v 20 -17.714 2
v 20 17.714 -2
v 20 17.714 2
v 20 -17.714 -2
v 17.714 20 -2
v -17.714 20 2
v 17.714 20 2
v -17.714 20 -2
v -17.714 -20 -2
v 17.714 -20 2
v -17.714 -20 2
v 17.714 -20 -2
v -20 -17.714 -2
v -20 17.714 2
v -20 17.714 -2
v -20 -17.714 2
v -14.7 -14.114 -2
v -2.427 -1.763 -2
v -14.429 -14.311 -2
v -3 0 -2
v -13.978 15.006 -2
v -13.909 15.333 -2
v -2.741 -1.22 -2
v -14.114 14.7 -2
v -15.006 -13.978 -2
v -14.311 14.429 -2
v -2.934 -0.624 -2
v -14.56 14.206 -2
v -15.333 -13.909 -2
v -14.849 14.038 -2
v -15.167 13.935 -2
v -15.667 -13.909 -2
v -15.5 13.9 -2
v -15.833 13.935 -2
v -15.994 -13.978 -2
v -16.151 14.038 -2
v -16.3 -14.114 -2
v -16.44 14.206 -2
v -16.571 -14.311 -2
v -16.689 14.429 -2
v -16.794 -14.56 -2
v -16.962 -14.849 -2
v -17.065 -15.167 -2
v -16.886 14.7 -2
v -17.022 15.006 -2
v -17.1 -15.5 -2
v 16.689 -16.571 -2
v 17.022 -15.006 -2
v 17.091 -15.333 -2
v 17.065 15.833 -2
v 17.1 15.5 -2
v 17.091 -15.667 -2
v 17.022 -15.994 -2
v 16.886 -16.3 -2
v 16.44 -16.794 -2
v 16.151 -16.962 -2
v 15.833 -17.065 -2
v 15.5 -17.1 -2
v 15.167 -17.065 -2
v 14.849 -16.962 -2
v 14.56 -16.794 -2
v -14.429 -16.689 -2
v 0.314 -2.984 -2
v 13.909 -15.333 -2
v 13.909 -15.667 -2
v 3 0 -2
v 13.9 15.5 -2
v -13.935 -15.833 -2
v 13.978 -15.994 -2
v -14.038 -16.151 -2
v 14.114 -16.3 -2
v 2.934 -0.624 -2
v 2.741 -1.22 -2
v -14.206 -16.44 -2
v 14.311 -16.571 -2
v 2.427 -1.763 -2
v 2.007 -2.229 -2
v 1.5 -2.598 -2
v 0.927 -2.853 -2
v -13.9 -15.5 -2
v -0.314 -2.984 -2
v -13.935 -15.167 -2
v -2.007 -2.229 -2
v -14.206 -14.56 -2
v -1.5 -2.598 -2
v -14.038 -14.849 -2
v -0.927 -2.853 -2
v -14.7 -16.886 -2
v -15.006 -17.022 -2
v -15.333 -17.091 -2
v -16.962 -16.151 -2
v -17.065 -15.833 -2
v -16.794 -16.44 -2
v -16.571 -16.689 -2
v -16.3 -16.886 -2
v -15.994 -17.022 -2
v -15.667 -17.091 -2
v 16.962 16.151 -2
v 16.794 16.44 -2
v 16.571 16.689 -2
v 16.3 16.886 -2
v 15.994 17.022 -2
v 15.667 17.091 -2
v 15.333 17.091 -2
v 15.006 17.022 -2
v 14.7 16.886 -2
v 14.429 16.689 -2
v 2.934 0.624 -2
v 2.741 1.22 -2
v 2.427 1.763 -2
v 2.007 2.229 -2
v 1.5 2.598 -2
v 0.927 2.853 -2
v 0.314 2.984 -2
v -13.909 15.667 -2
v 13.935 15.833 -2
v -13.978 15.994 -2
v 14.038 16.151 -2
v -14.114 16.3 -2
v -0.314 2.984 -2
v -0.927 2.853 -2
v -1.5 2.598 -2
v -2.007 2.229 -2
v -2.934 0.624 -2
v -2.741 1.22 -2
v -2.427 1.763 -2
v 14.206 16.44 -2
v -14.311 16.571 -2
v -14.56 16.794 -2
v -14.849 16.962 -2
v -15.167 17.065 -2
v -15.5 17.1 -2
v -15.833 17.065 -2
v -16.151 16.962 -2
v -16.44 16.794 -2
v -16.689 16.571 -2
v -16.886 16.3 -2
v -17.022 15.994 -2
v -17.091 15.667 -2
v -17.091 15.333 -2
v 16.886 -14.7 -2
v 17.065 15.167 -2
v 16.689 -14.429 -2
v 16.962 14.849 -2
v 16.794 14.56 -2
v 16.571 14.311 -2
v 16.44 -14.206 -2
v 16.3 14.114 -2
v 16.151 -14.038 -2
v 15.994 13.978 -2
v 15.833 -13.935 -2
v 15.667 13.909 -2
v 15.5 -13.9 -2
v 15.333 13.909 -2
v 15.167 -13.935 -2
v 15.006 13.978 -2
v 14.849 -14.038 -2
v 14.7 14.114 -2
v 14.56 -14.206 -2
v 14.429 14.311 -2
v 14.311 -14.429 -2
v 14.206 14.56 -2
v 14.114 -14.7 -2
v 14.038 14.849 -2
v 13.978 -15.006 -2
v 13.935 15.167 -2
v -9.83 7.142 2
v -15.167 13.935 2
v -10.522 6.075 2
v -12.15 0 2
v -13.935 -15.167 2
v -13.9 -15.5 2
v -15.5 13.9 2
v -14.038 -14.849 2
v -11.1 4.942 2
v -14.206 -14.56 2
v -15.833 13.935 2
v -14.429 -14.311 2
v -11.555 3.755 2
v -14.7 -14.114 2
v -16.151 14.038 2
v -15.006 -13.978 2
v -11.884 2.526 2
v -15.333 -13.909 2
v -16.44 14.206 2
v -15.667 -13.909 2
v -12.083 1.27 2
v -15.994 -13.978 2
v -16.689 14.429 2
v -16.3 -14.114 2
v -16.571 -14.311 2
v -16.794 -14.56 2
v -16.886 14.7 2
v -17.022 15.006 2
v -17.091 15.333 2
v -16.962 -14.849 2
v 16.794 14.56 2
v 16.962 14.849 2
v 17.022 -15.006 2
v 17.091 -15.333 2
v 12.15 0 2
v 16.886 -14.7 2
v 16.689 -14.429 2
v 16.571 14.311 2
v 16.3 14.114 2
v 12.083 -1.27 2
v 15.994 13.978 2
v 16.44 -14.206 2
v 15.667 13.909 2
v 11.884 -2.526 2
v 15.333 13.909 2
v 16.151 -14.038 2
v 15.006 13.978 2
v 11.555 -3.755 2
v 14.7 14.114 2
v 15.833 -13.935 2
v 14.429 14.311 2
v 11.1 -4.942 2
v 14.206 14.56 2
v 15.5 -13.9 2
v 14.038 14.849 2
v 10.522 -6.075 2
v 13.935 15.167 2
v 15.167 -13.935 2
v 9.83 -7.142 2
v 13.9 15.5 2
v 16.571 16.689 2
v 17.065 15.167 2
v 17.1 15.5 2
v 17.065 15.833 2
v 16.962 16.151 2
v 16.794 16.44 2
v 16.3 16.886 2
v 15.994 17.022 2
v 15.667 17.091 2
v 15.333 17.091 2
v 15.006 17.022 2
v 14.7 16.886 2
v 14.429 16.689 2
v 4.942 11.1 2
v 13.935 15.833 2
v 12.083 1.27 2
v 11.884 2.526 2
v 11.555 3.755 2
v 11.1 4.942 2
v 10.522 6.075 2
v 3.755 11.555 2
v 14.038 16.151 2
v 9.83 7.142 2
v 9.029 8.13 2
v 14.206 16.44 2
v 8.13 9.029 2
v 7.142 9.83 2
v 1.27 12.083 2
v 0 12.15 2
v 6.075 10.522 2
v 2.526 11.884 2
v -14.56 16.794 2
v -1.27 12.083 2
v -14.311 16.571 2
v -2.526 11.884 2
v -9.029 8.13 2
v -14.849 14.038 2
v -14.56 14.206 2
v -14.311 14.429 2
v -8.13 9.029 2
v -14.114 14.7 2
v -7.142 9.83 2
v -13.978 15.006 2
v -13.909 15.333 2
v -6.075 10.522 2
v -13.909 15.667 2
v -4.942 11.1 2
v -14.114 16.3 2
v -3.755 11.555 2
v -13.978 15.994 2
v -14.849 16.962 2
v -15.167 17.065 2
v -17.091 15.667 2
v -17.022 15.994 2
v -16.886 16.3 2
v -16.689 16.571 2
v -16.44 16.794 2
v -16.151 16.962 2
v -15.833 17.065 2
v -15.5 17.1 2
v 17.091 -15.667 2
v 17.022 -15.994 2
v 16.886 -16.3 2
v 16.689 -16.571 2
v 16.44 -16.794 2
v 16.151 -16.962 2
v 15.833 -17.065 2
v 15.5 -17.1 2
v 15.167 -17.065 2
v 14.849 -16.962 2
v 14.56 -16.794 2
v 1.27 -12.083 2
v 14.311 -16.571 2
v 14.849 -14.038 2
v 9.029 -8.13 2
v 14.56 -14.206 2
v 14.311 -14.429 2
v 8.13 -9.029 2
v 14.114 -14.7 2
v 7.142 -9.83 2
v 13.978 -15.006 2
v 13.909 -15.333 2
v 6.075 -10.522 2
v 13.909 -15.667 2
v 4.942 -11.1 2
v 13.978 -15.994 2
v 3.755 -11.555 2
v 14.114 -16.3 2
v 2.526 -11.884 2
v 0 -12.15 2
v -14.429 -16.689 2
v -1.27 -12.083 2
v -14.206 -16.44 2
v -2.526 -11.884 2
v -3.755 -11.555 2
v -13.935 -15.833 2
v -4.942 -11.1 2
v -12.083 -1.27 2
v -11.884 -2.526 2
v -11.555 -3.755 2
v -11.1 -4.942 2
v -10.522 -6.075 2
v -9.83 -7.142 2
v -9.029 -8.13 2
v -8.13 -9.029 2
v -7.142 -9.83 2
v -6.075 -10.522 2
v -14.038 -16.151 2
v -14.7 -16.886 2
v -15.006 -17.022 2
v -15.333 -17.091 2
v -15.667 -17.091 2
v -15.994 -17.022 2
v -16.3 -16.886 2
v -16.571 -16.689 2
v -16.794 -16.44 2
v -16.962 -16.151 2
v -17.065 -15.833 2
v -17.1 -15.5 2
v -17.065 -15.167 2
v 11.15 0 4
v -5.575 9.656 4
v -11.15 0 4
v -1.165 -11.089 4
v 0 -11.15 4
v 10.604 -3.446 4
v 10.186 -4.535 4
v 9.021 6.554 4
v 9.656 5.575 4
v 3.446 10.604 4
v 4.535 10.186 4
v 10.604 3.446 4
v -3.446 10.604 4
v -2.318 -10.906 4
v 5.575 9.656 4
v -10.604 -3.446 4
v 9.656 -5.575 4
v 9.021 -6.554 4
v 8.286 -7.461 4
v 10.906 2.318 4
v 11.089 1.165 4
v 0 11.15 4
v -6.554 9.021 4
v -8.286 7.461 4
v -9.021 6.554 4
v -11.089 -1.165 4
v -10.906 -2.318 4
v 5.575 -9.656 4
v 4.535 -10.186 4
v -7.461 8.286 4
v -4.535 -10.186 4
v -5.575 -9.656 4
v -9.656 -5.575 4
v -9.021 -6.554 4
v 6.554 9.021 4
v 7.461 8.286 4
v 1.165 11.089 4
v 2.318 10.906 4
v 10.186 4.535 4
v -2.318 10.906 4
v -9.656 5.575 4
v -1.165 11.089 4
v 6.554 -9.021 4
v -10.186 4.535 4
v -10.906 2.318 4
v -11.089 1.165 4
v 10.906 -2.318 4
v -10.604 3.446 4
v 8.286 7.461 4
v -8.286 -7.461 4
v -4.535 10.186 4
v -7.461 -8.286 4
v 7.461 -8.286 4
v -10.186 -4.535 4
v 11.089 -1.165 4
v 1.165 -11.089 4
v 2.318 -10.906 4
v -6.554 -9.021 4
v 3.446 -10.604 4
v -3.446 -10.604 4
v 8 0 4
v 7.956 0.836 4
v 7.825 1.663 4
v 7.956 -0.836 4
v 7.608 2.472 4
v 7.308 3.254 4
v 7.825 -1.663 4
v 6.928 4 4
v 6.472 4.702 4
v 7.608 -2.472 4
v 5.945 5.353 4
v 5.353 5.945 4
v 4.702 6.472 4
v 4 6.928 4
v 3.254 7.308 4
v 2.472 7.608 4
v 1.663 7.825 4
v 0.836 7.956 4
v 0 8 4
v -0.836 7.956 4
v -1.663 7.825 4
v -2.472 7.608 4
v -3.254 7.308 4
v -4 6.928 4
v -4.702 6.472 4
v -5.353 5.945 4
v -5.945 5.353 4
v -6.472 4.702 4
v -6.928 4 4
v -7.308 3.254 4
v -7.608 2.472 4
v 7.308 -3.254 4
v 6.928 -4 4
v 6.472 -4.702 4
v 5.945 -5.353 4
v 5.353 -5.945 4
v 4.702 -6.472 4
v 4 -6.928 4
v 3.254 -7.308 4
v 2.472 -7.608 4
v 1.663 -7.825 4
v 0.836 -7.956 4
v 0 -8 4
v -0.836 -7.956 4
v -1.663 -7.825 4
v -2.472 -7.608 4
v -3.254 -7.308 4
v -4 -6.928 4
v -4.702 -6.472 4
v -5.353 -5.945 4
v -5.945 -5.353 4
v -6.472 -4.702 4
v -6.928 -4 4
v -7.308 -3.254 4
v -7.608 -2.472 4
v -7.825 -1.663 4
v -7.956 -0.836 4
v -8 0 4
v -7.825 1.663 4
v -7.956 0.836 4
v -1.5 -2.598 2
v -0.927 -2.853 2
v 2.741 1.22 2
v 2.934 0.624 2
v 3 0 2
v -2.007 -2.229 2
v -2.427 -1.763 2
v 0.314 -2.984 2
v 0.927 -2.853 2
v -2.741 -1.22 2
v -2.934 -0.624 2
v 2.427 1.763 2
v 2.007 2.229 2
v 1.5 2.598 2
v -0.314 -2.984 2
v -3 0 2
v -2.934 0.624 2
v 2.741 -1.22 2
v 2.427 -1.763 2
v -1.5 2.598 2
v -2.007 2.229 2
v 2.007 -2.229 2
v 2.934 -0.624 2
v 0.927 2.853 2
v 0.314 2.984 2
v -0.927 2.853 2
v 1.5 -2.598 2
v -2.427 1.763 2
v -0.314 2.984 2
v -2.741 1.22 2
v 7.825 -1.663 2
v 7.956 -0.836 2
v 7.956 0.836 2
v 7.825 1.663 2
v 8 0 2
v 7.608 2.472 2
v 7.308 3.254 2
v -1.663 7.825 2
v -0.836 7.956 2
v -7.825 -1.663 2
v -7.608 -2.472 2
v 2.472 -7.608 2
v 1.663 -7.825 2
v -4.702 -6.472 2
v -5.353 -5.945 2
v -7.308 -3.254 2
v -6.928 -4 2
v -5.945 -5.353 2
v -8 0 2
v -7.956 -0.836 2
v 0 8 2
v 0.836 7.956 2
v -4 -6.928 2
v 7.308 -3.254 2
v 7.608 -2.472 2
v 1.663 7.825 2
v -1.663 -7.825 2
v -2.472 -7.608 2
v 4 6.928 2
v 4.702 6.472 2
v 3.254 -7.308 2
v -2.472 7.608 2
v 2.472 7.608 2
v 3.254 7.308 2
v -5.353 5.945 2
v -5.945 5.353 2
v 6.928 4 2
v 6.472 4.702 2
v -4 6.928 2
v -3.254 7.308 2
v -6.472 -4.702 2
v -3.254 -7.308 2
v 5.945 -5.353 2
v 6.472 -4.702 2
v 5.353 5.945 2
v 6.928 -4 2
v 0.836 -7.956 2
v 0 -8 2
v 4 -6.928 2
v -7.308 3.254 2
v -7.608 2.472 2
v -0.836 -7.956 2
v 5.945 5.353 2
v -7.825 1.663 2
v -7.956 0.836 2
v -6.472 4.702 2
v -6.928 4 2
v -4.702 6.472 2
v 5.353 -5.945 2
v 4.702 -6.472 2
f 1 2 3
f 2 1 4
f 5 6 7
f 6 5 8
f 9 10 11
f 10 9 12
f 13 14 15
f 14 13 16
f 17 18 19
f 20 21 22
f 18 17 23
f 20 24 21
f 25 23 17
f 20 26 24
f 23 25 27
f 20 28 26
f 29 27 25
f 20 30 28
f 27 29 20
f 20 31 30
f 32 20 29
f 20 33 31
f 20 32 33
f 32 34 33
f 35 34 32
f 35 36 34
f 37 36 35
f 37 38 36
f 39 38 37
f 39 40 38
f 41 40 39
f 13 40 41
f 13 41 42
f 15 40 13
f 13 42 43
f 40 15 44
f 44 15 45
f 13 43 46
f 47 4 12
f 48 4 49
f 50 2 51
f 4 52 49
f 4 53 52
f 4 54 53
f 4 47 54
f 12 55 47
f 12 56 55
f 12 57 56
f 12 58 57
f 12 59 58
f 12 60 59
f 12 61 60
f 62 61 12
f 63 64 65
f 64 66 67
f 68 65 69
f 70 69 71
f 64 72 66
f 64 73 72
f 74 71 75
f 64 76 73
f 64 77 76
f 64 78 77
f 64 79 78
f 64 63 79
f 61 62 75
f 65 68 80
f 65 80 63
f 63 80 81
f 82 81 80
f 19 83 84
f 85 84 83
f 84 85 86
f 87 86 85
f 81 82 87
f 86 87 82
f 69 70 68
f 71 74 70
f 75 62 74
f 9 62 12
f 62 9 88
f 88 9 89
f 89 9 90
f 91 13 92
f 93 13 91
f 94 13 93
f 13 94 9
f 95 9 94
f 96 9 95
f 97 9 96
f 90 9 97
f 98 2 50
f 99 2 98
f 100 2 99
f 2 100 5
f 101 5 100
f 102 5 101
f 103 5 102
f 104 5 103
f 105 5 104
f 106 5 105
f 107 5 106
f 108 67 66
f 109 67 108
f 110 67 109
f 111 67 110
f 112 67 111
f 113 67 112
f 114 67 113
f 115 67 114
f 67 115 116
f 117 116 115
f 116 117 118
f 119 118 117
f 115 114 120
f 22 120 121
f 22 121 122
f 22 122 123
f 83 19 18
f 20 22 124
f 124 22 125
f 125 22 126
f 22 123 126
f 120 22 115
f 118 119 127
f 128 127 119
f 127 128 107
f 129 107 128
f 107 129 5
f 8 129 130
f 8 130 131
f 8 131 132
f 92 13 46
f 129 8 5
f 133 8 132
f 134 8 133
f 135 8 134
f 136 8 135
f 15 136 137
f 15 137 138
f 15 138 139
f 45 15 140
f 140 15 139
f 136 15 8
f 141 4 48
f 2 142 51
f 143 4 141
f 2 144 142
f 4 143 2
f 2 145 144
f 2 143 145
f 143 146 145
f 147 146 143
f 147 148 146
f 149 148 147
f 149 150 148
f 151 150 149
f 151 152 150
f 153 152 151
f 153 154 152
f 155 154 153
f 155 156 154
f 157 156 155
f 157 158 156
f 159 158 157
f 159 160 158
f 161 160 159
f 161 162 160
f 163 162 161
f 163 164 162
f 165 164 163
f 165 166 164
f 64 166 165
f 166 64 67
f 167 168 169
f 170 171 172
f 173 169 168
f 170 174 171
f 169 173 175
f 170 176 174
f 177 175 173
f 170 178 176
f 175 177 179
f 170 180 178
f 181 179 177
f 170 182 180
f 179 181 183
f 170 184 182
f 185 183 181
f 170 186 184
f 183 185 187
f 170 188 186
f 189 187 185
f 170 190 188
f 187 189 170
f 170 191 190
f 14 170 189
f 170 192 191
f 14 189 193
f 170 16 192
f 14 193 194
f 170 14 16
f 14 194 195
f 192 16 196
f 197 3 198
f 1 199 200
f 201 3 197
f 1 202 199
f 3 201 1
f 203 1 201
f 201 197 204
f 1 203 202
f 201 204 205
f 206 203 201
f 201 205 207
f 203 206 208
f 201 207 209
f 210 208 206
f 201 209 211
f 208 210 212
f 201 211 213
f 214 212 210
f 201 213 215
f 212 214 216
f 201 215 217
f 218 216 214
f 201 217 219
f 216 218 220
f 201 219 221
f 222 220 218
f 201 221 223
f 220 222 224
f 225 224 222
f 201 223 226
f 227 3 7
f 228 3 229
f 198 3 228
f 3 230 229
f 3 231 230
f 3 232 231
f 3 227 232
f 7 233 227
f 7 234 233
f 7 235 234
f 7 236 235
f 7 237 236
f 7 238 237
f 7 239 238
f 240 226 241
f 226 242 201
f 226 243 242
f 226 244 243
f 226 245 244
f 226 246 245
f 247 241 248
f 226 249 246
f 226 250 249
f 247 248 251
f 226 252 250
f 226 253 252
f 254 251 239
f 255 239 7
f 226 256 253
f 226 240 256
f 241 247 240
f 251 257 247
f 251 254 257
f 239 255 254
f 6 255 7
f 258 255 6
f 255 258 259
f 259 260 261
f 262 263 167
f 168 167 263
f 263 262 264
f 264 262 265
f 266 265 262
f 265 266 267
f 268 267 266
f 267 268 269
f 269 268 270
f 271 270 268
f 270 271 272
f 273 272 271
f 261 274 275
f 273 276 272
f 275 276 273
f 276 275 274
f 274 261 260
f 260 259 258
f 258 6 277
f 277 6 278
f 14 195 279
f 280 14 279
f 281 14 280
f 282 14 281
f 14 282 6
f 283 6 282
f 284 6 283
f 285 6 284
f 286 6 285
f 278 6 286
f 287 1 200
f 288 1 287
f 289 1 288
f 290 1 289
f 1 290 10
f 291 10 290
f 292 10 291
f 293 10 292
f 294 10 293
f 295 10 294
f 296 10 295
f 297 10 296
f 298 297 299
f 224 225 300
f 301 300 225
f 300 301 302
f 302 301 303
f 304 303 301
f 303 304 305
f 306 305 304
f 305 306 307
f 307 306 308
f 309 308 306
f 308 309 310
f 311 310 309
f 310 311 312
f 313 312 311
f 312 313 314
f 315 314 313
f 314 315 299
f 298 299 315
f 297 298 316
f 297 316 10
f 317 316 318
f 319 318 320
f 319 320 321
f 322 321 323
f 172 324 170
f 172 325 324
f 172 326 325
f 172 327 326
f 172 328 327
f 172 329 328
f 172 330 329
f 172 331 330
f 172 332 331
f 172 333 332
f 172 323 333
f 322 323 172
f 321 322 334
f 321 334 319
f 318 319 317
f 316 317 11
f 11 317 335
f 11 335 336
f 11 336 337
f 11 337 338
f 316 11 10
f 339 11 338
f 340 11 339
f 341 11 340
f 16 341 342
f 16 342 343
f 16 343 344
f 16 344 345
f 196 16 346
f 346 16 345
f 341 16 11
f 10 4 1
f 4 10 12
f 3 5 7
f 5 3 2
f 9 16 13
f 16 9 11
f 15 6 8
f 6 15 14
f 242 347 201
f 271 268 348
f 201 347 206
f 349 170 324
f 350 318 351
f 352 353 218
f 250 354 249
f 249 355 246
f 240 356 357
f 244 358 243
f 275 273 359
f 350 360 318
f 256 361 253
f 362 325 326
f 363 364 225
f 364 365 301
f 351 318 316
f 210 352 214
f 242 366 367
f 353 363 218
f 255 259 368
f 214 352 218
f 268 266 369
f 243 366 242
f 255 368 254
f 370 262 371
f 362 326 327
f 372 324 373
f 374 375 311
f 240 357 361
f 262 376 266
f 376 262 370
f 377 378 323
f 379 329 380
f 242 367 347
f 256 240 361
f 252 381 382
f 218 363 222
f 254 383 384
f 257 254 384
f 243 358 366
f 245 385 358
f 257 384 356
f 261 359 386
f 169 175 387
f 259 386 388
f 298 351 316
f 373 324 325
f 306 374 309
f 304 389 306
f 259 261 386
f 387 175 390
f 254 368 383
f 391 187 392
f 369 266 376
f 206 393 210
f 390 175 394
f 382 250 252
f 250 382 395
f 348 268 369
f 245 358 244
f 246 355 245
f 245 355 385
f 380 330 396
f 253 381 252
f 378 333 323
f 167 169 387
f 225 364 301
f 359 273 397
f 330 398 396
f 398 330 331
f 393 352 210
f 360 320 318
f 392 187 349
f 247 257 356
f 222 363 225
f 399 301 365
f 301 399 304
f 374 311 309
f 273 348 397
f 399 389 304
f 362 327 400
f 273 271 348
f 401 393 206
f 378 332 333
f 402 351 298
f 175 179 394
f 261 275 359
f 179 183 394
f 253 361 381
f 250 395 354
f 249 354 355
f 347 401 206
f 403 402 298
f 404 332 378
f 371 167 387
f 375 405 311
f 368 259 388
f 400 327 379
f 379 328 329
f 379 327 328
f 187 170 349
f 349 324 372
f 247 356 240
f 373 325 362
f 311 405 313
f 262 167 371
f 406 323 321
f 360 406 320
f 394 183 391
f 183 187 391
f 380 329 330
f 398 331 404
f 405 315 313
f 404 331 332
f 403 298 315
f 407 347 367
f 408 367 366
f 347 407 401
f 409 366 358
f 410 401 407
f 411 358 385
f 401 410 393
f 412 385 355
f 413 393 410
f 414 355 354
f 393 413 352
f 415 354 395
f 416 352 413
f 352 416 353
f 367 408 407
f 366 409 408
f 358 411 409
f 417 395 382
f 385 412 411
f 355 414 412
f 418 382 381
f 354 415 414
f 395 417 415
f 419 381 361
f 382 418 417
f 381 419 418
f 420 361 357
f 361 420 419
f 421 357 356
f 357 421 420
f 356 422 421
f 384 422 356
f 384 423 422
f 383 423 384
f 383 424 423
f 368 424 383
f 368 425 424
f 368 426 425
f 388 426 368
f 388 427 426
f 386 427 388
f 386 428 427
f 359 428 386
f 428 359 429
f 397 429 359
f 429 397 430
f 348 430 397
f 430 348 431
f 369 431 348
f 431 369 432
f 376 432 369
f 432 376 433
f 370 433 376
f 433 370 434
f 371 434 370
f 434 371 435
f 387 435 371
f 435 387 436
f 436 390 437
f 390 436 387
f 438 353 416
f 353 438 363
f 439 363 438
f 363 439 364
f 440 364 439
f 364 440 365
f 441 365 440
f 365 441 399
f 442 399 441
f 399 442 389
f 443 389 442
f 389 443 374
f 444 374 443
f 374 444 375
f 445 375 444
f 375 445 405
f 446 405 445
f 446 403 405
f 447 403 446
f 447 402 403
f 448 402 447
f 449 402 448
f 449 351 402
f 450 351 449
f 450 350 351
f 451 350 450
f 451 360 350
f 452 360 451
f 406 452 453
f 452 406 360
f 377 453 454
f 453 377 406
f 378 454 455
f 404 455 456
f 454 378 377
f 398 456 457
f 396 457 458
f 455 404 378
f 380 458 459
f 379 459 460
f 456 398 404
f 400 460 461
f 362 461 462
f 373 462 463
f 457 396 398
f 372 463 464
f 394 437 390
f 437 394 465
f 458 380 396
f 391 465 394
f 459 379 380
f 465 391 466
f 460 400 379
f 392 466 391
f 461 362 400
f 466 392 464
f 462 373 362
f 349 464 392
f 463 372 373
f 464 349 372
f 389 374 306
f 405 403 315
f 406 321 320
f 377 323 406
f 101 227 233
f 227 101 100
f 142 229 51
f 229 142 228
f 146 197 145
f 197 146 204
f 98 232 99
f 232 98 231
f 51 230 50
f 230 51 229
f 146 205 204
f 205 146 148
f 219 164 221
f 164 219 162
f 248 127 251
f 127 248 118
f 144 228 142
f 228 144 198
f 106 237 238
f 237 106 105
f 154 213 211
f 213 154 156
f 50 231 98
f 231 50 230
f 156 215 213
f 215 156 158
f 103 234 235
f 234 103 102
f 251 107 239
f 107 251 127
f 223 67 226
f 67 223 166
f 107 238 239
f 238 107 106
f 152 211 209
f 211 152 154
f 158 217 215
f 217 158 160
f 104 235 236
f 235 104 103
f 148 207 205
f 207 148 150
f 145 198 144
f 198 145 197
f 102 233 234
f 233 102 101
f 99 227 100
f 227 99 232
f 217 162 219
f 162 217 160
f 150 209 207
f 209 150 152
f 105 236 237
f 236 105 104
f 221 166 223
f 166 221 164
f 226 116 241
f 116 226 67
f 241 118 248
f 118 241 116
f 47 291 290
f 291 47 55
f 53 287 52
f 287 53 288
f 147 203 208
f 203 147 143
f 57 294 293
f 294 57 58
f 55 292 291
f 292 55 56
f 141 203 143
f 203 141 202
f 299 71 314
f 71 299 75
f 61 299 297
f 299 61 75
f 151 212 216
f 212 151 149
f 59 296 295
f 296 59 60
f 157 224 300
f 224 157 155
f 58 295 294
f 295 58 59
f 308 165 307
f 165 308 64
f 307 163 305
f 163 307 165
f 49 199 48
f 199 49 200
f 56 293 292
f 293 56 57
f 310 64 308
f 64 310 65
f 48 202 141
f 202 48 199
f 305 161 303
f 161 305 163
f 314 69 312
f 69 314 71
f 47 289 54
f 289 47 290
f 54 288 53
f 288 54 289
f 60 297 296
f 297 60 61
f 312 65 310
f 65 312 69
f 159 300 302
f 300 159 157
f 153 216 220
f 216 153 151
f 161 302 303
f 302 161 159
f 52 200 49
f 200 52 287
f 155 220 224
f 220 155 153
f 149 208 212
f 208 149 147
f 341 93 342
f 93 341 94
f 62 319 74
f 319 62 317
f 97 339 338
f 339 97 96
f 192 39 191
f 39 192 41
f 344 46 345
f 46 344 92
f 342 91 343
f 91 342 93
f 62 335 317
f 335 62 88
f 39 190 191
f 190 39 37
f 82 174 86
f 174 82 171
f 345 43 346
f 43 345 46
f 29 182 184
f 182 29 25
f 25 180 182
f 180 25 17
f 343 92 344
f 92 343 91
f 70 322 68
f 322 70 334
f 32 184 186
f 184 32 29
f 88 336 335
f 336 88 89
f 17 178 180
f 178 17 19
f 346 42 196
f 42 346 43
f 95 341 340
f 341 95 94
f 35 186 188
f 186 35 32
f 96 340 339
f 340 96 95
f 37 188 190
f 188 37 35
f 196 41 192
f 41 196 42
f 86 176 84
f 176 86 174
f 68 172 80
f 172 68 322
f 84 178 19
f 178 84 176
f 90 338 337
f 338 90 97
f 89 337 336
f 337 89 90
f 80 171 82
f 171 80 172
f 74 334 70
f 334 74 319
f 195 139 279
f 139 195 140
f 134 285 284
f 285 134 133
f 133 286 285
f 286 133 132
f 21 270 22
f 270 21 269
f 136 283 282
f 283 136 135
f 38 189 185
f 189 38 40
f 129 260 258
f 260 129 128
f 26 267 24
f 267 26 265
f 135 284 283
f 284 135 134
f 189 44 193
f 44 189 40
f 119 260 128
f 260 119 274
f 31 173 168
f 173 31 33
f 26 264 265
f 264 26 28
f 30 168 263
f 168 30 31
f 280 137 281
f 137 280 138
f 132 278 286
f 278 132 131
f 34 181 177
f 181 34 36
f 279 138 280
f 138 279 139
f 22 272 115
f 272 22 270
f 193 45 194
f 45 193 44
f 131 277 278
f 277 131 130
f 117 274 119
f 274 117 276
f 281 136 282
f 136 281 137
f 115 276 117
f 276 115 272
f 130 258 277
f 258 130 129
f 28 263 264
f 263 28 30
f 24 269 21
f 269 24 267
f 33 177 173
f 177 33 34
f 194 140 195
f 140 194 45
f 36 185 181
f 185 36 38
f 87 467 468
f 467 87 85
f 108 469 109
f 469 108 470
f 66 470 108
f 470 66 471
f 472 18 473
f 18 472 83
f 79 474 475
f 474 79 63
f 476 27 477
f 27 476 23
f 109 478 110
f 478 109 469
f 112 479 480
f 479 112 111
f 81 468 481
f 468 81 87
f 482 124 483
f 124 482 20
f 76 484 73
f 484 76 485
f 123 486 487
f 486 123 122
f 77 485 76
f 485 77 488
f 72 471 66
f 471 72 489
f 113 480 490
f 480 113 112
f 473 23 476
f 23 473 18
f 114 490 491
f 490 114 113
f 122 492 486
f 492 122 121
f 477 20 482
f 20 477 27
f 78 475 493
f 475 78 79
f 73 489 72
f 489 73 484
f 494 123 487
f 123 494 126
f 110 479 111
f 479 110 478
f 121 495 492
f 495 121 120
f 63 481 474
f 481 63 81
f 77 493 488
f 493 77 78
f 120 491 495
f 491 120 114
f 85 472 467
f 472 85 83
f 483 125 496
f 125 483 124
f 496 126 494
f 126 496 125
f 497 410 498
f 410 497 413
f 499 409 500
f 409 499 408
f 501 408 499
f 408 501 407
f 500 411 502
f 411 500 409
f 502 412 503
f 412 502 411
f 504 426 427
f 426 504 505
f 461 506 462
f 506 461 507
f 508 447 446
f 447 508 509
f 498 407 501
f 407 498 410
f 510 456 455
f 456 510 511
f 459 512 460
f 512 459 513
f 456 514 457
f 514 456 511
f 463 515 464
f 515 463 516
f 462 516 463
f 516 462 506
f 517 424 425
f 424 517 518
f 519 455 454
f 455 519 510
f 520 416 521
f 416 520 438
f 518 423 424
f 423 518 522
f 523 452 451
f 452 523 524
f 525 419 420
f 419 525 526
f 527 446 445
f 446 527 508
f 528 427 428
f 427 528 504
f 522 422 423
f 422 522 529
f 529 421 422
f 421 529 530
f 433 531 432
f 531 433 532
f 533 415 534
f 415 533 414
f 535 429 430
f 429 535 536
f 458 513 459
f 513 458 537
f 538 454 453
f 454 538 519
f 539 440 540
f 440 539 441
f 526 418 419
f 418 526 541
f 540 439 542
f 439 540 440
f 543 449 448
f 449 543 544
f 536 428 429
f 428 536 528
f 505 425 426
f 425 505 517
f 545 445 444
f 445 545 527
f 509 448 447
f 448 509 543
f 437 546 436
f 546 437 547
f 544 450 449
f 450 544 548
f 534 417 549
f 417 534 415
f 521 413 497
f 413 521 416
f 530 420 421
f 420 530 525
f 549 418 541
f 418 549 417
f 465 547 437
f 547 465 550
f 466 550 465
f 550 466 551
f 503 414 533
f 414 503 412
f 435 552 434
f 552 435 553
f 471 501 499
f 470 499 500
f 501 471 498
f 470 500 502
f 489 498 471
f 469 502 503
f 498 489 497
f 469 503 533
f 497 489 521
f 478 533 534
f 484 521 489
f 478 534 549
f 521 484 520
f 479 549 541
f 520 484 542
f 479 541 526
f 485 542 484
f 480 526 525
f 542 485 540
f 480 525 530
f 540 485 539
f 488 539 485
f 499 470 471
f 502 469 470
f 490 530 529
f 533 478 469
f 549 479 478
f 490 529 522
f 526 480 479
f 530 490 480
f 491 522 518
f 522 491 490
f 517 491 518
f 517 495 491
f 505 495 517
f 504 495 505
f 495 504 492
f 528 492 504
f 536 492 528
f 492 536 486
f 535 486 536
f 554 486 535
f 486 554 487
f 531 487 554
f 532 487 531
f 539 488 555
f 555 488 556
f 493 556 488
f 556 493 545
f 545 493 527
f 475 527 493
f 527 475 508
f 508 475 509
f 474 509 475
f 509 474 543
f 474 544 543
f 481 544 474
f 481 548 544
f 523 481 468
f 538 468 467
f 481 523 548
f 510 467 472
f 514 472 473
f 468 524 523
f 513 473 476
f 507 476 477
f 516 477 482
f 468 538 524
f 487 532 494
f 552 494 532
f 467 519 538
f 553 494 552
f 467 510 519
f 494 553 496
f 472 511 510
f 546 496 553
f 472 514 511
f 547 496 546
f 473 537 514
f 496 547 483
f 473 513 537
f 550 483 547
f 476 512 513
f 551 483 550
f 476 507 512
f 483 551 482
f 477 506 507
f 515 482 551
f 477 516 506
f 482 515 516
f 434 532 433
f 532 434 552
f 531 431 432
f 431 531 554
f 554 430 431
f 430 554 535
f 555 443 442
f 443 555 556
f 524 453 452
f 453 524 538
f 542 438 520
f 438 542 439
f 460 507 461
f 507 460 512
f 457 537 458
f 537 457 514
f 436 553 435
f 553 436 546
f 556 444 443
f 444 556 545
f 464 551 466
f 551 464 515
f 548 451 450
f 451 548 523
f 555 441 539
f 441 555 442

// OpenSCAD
// file: beam.scad
// Misumi Beam
module misumibeam(size1=15, size2=15, length=100, extra=0.1) {
   difference() {
      cube([size1+extra, size2+extra, length], center=true);
      for (a = [0:180:180]) rotate([0, 0, a]) {
         translate([size1/2, 0, 0]) {
          //  % cube([size1/2, 3, length+1], center=true);
			minkowski() {
               cube([size1/2-(extra+1), size1/6-extra, length+1], center=true);
               cylinder(r=0.5, h=1, center=true);
			} 
        }
      }
      for (a = [0:90:270]) rotate([0, 0, a]) {
         translate([size2/2, 0, 0]) {
          //  % cube([size1/2, 3, length+1], center=true);
			minkowski() {
               cube([size1/2-(extra+1), size1/6-extra, length+1], center=true);
               cylinder(r=0.5, h=1, center=true);
			} 
        }
      }
   }
}

# misumibeam(15, 15, 300);
// file: nema17.scad
include <configuration.scad>;

// NEMA17 stepper motor

module stepper_motor(length=47.5, shaft_radius=5.00/2) {
   intersection() {
      cube([42.2, length, 42.2], center=true);
      rotate([90, 0, 0])
      cylinder(r=25.5, h=length+1, center=true);
   }
   translate([0, -length/2, 0]) {
// drive shaft
		rotate([90, 0, 0]) {
		 cylinder(r1=11, r2=11, h=2, $fn=40);
		 cylinder(r=shaft_radius, h=25);
		}
// mounting bolts
      for (a = [0:90:360]) rotate([0, a, 0]) {
         translate([15.5, 0, 15.5]) rotate([90, 0, 0])
         cylinder(r=m3_major_radius, h=10,  $fn=30);
      }
   }
}

module stepper_motor_boolean(length=47.5, shaft_radius=7.00/2) {
   intersection() {
      cube([42.2, length, 42.2], center=true);
      rotate([90, 0, 0])
      cylinder(r=25.5, h=length+1, center=true);
   }
   translate([0, -length/2, 0]) {
// drive shaft
		rotate([90, 0, 0]) {
		 cylinder(r1=12+extra_boolean, r2=11+extra_boolean, h=2, $fn=40);
		 cylinder(r=shaft_radius, h=25, $fn=8);
		}
// mounting bolts
      for (a = [0:90:360]) rotate([0, a, 0]) {
         translate([15.5, 0, 15.5]) rotate([90, 0, 0])
         cylinder(r=m3_major_radius+extra_radius, h=10,  $fn=8);
      }
   }
}

//# stepper_motor();
# stepper_motor_boolean();
// file: metric_fastners.scad
/*
 *  OpenSCAD Metric Fastners Library (www.openscad.org)
 *  Copyright (C) 2010-2011  Giles Bathgate
 *
 *  This program is free software; you can redistribute it and/or modify
 *  it under the terms of the GNU General Public License as published by
 *  the Free Software Foundation; either version 3 of the License,
 *  LGPL version 2.1, or (at your option) any later version of the GPL.
 *
 *  This program is distributed in the hope that it will be useful,
 *  but WITHOUT ANY WARRANTY; without even the implied warranty of
 *  MERCHANTABILITY or FITNESS FOR A PARTICULAR PURPOSE.  See the
 *  GNU General Public License for more details.
 *
 *  You should have received a copy of the GNU General Public License
 *  along with this program; if not, write to the Free Software
 *  Foundation, Inc., 59 Temple Place, Suite 330, Boston, MA 02111-1307 USA
 *
*/

$fn=50;
apply_chamfer=false;

// M3 Mesurements
m3_minor_radius = 2.50/2;
m3_major_radius = 3.00/2;
m3_head_radius = 5.50/2;
m3_nut_radius = 6.20/2;

// M4 Mesurements
m4_minor_radius = 3.30/2;
m4_major_radius = 4.00/2;
m4_head_radius = 7.00/2;
m4_nut_radius = 8.26/2;

// M5 Mesurements
m5_minor_radius = 4.20/2;
m5_major_radius = 5.00/2;
m5_head_radius = 8.50/2;
m5_nut_radius = 10.33/2;

// M6 Mesurements
m6_minor_radius = 5.00/2;
m6_major_radius = 6.00/2;
m6_head_radius = 10.00/2;
m6_nut_radius = 12.40/2;


module cap_bolt(dia,len)
{
	e=1.5*dia;
	h1=1.25*dia;
	cylinder(r=dia/2,h=len);
	translate([0,0,-h1]) cylinder(r=e/2,h=h1);
}

module cap_bolt_boolean(dia,len,fn=8)
{
	e=1.87*dia;
	h1=2*dia;
	cylinder(r=dia/2,h=len,$fn=fn);
	translate([0,0,-h1+0.05]) cylinder(r2=e/2+0.15,r1=e/2+0.3,h=h1,$fn=fn);
}

module csk_bolt(dia,len)
{
	h1=0.6*dia;
	h2=len-h1;
	cylinder(r=dia/2,h=h2);
	cylinder(r1=dia,r2=dia/2,h=h1);
}

module washer(dia)
{
	t=0.1*dia;
	difference()
	{
		cylinder(r=dia,h=t);
		translate([0,0,-t/2])cylinder(r=dia/2,h=t*2);
	}
}

module flat_nut(dia)
{
	m=0.8*dia;
	e=2.066*dia;
	c=0.2*dia;
	difference()
	{
		cylinder(r=e/2,h=m,$fn=6);
		translate([0,0,-m/2])cylinder(r=dia/2,h=m*2);
		if(apply_chamfer)
		    translate([0,0,c])cylinder_chamfer(e/2,c);
	}
}

module flat_nut_boolean(dia)
{
	m=0.8*dia;
	e=2.066*dia;
	c=0.2*dia;
	difference()
	{
		cylinder(r=e/2,h=m,$fn=6);
		if(apply_chamfer)
		    translate([0,0,c])cylinder_chamfer(e/2,c);
	}
}

module bolt(dia,len)
{
	e=1.8*dia;
	k=0.7*dia;
	c=0.2*dia;
	difference()
	{
		cylinder(r=e/2,h=k,$fn=6);
		if(apply_chamfer)
		    translate([0,0,c])cylinder_chamfer(e/2,c);
	}

	cylinder(r=dia/2,h=len);

}

module cylinder_chamfer(r1,r2)
{
	t=r1-r2;
	p=r2*2;
	rotate_extrude()
	difference()
	{
		translate([t,-p])square([p,p]);
		translate([t,0])circle(r2);
	}
}

module chamfer(len,r)
{
	p=r*2;
	linear_extrude(height=len)
	difference()
	{
		square([p,p]);
		circle(r);
	}
}

union()
{
//cap_bolt(3,15);
//cap_bolt_boolean(3,15,30);
//csk_bolt(3,14);
//washer(3);
//flat_nut_boolean(3);
//bolt(4,14);
//cylinder_chamfer(8,1);
//chamfer(10,2);
}
// file: configuration.scad
// Delta-Six 3D Printer 
// Created by Sage Merrill
// Released on Openbuilds.com
// Based on orginal design by Johann C. Rocholl (Kossel Printer)
// License = Attribution Share Alike - CC BY SA


include <metric_fastners.scad>;
use <nema17.scad>;
use <beam.scad>;
use <timing_belts.scad>;

$fn=20;

// Increase this if your slicer or printer makes the holes too small.
extra_radius = 0.10;
extra_boolean = 0.15;

// Delta Parameters
global_delta_arm_seperation = 55;
global_effector_bore_radius = 21;
global_mounting_hole_radius = 27;

// M5 Hardware
m5_bolt = m5_major_radius*2;
m5_bolt_boolean = m5_bolt+extra_radius;

// M3 Hardware
m3_bolt = m3_major_radius*2;
m3_bolt_boolean = m3_bolt+extra_radius;

// NEMA17 stepper motor
motor_length = 47.5;
motor_shaft_radius= 5.00/2;
// main file
// Delta-Six 3D Printer 
// Created by Sage Merrill
// Released on Openbuilds.com
// Based on orginal design by Johann C. Rocholl (Kossel Printer)
// License = Attribution Share Alike - CC BY SA

include <configuration.scad>;


module idler_block(length=4, shaft_radius=5.00/2) {
difference() {	
	union() {
		intersection() {
			translate([0, 0, 0]) rotate([0, 0, 0])
			 cube([40, length, 40], center=true);
			translate([0, 0, 0]) rotate([90, 0, 0])
			 cylinder(r=27, h=length+1, center=true, $fn=20);
	  	}

	translate([0, -length/2, 0]) rotate([90, 0, 0])
	 cylinder(r1=12+extra_boolean, r2=11+extra_boolean, h=2, $fn=60);
	}

// idler shaft
	translate([0, 0, 0]) rotate([90, 0, 0])
	 cylinder(r=shaft_radius+0.5, h=50, center=true, $fn=30);

// Bearing shaft
	translate([0, -length/2, 0]) rotate([90, 0, 0])
	 cylinder(r=8, h=5, $fn=60);

// mounting bolts
	for (a = [0:90:360]) rotate([0, a, 0]) {
		translate([15.5, 15, 15.5]) rotate([90, 0, 0])
		 cylinder(r=m3_major_radius+extra_radius, h=30,  $fn=30);
	}

*	for (a = [-1, 1]) translate([0, -48.7, 0]) rotate([0, 0, 30*a]) {
		translate([1*a, 30, 0]) rotate([90, 30, 0])
		 cylinder(r=5, h=60, center=true, $fn=30);
	}
}
}

// Primary Placement
translate([0, 0, 0]) rotate([-90, 0, 0])
 idler_block();
